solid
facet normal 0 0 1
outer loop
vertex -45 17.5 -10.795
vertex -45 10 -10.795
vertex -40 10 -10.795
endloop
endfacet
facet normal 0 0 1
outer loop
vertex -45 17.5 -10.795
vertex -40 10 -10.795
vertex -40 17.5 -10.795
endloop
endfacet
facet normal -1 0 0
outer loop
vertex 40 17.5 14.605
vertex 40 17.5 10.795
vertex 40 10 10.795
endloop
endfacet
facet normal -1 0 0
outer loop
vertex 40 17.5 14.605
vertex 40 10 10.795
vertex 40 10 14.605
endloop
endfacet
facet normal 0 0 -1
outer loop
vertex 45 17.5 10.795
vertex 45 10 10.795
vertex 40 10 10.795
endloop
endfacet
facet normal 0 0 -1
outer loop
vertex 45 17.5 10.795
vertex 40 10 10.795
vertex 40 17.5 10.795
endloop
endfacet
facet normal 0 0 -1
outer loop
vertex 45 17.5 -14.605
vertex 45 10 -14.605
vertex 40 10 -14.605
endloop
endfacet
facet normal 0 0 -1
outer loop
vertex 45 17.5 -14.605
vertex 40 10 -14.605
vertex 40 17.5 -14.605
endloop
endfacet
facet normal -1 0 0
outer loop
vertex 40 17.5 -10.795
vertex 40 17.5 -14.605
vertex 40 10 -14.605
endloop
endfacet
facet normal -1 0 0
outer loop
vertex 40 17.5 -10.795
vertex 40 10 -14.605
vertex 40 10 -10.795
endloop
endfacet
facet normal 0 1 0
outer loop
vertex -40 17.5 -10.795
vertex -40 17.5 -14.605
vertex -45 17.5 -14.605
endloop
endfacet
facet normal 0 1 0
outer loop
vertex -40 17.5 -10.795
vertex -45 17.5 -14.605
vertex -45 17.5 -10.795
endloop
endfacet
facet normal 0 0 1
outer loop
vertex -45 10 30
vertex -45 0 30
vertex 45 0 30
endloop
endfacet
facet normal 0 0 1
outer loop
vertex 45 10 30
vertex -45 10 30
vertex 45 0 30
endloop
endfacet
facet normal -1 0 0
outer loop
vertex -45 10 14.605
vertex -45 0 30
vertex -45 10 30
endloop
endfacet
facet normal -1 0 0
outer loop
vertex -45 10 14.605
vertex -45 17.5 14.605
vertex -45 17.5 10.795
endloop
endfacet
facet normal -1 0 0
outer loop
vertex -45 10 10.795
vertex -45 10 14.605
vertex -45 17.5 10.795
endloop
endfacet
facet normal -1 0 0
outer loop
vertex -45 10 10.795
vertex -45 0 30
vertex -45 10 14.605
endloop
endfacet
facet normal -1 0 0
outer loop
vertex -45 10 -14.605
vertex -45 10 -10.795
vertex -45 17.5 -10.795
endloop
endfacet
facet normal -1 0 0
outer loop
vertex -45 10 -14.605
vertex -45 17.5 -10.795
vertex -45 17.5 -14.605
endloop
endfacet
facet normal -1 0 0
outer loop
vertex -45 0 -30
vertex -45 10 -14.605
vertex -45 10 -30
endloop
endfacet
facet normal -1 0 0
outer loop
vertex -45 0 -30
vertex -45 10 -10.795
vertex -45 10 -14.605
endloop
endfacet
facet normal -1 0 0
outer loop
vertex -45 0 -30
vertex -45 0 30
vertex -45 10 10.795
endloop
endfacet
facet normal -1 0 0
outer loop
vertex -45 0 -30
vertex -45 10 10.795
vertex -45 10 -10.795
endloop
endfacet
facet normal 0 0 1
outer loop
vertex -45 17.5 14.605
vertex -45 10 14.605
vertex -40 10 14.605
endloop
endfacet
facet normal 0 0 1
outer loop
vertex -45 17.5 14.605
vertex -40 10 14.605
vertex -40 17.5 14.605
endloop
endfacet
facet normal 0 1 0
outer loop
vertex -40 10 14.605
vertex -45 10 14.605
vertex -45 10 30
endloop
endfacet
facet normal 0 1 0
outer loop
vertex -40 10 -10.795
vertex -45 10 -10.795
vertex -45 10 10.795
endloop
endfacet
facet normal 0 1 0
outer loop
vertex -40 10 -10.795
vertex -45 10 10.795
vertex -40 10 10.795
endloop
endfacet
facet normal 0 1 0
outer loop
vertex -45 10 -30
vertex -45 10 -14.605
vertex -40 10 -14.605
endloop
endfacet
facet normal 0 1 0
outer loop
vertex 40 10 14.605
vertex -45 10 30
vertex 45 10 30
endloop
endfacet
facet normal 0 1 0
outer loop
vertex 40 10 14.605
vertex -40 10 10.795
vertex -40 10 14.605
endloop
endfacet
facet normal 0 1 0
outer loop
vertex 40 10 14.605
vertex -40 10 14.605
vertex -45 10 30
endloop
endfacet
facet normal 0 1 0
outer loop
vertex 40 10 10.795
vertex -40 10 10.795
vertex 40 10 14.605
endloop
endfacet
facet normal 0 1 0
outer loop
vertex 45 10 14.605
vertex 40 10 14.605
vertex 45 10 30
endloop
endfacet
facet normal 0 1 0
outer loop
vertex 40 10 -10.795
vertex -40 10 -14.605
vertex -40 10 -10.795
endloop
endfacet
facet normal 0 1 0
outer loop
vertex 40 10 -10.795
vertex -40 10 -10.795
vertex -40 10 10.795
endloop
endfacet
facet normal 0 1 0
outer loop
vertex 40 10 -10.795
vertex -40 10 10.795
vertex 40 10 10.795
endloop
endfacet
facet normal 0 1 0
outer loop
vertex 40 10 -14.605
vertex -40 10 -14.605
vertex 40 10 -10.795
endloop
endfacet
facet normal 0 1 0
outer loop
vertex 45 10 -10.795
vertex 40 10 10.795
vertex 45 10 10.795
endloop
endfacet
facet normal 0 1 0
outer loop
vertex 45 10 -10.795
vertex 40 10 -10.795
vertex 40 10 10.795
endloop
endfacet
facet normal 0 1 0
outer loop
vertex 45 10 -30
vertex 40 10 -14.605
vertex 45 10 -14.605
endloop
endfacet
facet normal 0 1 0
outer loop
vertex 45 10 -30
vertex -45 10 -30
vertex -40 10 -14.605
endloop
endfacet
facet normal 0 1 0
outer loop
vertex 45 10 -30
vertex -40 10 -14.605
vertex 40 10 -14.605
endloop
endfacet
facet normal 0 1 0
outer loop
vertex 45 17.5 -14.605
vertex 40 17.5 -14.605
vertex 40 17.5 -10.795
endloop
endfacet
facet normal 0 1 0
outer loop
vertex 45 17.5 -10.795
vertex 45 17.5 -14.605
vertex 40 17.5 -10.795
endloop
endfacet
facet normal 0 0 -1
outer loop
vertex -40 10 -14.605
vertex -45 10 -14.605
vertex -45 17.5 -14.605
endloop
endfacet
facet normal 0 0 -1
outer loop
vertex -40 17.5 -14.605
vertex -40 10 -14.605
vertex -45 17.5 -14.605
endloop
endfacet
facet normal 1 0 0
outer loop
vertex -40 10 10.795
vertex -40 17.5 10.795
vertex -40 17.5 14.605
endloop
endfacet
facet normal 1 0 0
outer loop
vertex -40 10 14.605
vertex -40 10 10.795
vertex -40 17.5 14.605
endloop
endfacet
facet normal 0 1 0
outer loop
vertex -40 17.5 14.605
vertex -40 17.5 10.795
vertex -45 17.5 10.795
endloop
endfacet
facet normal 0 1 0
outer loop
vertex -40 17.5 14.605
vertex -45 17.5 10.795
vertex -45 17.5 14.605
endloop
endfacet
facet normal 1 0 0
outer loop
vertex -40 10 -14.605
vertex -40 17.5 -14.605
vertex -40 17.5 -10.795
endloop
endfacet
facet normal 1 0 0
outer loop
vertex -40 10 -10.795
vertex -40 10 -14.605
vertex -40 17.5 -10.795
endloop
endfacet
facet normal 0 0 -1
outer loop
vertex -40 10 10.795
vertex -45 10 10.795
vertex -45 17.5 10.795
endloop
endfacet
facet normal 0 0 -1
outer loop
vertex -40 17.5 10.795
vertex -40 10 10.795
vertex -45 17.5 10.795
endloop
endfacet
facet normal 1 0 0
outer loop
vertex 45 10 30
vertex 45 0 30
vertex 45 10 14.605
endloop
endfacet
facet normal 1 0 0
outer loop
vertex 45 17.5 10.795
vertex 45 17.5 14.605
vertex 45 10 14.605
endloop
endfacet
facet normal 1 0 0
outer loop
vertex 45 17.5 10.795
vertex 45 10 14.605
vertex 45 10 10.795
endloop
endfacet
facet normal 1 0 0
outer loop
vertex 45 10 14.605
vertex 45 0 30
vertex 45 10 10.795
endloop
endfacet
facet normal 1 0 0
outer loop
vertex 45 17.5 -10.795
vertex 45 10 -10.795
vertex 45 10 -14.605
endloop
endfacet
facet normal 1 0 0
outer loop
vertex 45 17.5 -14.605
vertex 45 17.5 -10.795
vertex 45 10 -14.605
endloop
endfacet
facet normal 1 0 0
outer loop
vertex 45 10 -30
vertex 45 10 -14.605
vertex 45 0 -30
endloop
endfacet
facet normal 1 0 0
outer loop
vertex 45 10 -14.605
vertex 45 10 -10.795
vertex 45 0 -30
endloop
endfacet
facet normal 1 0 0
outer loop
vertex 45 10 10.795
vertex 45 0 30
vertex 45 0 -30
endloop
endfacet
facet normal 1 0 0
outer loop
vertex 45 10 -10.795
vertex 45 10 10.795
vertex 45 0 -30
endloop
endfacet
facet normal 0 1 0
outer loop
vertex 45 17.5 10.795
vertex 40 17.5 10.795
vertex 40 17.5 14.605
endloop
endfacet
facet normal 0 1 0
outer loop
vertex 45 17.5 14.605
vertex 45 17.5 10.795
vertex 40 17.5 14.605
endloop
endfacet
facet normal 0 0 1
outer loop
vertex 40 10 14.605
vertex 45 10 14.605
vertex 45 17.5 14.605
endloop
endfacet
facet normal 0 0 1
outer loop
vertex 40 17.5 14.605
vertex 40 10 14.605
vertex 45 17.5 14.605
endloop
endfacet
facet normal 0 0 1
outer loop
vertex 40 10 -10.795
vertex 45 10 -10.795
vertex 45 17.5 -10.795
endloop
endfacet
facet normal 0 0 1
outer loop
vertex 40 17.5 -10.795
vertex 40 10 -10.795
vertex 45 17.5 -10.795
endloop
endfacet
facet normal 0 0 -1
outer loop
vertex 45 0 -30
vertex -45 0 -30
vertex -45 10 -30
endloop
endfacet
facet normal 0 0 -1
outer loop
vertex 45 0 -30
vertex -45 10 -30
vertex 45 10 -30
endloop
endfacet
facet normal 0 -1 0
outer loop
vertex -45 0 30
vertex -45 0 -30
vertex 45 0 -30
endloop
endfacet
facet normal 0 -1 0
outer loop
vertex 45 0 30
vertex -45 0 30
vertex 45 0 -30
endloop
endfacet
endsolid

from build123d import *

# Parameters (mm, degrees)
SKETCH1_W           = 90
SKETCH1_H           = 60
BOSS_EXTRUDE1_DEPTH = 10
SKETCH4_W           = 3.81
SKETCH4_H           = 7.5
BOSS_EXTRUDE2_DEPTH = 5


with BuildPart() as part:
    # Sketch1 → Boss-Extrude1 (new body)
    with BuildSketch(Plane(origin=(0, 0, 0), x_dir=(1, 0, 0), z_dir=(0, 1, 0))):
        Rectangle(SKETCH1_W, SKETCH1_H)
    extrude(amount=BOSS_EXTRUDE1_DEPTH)

    # Sketch4 → Boss-Extrude2 (add)
    with BuildSketch(Plane.ZY.offset(45)):
        with Locations((-12.7, 13.75)):
            Rectangle(SKETCH4_W, SKETCH4_H)
        with Locations((12.7, 13.75)):
            Rectangle(SKETCH4_W, SKETCH4_H)
    boss_extrude2 = extrude(amount=-BOSS_EXTRUDE2_DEPTH)

    # Mirror1: Boss-Extrude2 across plane
    add(boss_extrude2.mirror(Plane(origin=(0, 0, 0), x_dir=(0, 0, 1), z_dir=(1, 0, 0))))


solid = part.part
